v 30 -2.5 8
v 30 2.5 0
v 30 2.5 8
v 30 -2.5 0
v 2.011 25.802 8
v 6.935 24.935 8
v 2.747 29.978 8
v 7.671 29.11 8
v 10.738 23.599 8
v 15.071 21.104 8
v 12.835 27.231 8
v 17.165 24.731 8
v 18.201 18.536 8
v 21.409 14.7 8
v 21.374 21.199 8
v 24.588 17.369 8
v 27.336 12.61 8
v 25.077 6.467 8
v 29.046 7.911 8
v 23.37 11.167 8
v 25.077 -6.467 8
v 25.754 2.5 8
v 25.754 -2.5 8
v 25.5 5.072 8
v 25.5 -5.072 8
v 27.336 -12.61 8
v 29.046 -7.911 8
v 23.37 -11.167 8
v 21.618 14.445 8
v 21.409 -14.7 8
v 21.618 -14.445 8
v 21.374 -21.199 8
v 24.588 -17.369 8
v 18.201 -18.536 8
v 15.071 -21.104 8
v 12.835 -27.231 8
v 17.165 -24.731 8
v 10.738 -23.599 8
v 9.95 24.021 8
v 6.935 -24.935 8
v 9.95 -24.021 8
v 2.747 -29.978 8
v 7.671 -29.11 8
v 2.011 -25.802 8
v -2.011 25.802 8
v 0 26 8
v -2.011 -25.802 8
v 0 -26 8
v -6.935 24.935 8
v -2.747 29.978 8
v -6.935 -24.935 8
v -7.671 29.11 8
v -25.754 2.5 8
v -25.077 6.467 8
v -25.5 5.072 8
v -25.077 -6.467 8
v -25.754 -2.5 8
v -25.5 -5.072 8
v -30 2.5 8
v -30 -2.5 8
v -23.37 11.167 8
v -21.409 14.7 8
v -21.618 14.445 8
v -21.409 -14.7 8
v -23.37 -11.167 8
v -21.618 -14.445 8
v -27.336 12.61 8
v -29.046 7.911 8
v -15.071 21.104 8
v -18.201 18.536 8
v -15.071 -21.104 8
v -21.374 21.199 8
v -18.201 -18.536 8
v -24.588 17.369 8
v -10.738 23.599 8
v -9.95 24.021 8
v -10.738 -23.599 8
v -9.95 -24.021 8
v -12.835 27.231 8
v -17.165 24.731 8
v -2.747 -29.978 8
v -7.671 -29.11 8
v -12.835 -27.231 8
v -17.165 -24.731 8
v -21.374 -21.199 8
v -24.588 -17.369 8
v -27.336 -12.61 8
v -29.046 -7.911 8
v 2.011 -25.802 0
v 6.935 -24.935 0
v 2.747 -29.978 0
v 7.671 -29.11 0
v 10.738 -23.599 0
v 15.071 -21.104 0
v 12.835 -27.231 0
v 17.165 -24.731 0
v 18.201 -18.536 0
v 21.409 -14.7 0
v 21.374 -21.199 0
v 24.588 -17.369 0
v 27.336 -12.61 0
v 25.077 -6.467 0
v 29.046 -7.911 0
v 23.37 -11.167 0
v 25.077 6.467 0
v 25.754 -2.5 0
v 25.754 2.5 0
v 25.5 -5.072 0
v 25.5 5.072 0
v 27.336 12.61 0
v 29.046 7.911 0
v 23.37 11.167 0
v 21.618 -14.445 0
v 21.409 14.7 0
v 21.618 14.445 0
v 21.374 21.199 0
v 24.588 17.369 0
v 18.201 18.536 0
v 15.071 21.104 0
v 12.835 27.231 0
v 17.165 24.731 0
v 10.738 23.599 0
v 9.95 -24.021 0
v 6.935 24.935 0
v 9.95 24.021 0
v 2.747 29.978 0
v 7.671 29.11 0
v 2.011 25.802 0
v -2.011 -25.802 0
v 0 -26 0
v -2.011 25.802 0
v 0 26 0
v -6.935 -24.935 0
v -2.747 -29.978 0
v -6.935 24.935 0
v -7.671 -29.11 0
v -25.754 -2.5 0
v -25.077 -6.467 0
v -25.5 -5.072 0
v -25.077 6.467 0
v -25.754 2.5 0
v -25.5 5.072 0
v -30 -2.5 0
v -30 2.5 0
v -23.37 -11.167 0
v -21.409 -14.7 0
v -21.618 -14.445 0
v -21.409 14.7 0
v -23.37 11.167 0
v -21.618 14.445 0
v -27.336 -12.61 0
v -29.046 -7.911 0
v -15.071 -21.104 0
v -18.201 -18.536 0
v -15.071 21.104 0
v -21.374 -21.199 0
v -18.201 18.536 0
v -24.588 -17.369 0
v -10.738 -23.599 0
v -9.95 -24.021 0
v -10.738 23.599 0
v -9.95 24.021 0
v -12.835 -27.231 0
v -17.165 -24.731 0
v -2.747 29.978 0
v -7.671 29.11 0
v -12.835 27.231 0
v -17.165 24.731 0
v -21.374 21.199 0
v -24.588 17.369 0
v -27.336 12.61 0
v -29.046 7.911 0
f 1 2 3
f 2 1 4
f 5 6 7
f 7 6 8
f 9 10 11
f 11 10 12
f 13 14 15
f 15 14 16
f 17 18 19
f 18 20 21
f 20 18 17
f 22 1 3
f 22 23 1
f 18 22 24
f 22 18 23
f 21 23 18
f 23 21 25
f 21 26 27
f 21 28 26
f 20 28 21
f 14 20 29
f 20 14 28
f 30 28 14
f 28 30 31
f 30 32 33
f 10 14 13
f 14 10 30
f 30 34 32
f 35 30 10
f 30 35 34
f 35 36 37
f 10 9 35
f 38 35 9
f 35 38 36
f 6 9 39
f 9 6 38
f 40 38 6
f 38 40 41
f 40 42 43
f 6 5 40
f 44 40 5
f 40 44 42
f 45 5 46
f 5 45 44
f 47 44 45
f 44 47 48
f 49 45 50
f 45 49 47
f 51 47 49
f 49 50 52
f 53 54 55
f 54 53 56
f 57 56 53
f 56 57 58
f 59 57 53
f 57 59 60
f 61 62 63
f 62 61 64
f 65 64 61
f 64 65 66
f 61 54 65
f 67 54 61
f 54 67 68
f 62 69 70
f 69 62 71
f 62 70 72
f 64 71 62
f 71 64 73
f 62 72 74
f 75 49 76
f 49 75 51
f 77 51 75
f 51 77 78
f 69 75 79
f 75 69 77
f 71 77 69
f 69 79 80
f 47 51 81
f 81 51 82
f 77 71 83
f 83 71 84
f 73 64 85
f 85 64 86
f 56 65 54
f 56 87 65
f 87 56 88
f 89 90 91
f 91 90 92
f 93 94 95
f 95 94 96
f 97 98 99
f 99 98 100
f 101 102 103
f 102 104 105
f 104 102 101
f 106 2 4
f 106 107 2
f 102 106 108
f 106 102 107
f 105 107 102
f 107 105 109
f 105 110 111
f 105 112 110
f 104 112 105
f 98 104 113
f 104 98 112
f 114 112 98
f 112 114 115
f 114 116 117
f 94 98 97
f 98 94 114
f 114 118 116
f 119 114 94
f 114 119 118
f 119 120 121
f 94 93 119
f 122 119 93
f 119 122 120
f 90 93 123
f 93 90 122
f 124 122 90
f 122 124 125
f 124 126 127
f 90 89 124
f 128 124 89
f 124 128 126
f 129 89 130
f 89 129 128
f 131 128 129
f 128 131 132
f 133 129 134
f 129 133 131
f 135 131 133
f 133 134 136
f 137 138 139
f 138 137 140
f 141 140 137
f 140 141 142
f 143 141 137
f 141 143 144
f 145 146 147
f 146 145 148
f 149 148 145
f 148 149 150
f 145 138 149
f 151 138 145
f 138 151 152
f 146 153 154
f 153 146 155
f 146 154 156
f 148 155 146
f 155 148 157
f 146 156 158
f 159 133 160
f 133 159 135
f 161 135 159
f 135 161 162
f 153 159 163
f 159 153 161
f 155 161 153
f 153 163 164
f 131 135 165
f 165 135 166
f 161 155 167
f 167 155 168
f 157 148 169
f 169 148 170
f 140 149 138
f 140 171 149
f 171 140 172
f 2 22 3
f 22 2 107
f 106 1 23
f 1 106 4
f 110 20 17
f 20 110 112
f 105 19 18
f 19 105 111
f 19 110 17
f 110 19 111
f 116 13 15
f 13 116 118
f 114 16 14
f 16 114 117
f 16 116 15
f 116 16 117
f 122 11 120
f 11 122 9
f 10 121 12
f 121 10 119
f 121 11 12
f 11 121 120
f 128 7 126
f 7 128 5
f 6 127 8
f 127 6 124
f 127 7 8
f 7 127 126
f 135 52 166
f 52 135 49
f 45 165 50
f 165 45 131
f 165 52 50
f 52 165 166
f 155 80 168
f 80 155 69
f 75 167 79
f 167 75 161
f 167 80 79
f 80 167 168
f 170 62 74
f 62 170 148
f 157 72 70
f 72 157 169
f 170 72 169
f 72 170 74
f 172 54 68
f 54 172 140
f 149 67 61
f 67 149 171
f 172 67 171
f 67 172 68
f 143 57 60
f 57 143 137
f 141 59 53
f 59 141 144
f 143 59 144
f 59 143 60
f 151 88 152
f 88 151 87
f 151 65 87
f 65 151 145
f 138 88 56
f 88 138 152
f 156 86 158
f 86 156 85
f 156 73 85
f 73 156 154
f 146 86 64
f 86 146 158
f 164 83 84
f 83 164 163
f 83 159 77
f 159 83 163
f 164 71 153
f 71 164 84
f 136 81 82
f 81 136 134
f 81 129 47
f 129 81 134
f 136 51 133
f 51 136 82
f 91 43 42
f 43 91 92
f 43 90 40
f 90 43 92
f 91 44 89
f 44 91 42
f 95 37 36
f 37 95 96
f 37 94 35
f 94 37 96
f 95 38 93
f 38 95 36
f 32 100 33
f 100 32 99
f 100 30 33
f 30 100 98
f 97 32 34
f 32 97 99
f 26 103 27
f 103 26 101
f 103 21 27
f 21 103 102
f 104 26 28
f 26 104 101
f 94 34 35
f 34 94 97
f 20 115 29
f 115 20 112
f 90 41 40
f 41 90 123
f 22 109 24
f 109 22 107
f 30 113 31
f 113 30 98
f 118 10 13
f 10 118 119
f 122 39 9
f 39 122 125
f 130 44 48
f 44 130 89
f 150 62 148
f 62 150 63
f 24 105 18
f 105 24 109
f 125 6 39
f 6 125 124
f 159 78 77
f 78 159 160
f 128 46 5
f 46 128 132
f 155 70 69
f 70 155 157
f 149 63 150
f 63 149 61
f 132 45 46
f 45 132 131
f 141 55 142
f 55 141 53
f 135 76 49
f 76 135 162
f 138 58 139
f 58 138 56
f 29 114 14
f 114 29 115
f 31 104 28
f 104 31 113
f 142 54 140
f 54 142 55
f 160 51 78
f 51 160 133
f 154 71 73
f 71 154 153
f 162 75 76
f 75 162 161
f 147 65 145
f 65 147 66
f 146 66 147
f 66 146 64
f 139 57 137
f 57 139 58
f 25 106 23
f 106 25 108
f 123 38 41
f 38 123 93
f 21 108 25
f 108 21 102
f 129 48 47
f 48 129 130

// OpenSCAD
$fn = 32;

// ----------------------------------------------------------------------
// Spur blank: plain gear blank
// ----------------------------------------------------------------------

// --- parameters (mm) ---
disc_r = 26;              // blank root radius
disc_t = 8;               // blank thickness
n_teeth = 18;             // stub tooth count
tooth_w = 5;              // tooth width at the root
tooth_h = 4;              // tooth height above the root

out_r = disc_r + tooth_h;  // tip radius
bbox_x = 60.0;  // measured width over the teeth
bbox_y = 59.96;  // measured depth over the teeth

union() {
  cylinder(r = disc_r, h = disc_t);
  for (i = [0 : n_teeth - 1])
    rotate([0, 0, i * 360 / n_teeth])
      translate([disc_r - 1, -tooth_w / 2, 0])
        cube([tooth_h + 1, tooth_w, disc_t]);
}
